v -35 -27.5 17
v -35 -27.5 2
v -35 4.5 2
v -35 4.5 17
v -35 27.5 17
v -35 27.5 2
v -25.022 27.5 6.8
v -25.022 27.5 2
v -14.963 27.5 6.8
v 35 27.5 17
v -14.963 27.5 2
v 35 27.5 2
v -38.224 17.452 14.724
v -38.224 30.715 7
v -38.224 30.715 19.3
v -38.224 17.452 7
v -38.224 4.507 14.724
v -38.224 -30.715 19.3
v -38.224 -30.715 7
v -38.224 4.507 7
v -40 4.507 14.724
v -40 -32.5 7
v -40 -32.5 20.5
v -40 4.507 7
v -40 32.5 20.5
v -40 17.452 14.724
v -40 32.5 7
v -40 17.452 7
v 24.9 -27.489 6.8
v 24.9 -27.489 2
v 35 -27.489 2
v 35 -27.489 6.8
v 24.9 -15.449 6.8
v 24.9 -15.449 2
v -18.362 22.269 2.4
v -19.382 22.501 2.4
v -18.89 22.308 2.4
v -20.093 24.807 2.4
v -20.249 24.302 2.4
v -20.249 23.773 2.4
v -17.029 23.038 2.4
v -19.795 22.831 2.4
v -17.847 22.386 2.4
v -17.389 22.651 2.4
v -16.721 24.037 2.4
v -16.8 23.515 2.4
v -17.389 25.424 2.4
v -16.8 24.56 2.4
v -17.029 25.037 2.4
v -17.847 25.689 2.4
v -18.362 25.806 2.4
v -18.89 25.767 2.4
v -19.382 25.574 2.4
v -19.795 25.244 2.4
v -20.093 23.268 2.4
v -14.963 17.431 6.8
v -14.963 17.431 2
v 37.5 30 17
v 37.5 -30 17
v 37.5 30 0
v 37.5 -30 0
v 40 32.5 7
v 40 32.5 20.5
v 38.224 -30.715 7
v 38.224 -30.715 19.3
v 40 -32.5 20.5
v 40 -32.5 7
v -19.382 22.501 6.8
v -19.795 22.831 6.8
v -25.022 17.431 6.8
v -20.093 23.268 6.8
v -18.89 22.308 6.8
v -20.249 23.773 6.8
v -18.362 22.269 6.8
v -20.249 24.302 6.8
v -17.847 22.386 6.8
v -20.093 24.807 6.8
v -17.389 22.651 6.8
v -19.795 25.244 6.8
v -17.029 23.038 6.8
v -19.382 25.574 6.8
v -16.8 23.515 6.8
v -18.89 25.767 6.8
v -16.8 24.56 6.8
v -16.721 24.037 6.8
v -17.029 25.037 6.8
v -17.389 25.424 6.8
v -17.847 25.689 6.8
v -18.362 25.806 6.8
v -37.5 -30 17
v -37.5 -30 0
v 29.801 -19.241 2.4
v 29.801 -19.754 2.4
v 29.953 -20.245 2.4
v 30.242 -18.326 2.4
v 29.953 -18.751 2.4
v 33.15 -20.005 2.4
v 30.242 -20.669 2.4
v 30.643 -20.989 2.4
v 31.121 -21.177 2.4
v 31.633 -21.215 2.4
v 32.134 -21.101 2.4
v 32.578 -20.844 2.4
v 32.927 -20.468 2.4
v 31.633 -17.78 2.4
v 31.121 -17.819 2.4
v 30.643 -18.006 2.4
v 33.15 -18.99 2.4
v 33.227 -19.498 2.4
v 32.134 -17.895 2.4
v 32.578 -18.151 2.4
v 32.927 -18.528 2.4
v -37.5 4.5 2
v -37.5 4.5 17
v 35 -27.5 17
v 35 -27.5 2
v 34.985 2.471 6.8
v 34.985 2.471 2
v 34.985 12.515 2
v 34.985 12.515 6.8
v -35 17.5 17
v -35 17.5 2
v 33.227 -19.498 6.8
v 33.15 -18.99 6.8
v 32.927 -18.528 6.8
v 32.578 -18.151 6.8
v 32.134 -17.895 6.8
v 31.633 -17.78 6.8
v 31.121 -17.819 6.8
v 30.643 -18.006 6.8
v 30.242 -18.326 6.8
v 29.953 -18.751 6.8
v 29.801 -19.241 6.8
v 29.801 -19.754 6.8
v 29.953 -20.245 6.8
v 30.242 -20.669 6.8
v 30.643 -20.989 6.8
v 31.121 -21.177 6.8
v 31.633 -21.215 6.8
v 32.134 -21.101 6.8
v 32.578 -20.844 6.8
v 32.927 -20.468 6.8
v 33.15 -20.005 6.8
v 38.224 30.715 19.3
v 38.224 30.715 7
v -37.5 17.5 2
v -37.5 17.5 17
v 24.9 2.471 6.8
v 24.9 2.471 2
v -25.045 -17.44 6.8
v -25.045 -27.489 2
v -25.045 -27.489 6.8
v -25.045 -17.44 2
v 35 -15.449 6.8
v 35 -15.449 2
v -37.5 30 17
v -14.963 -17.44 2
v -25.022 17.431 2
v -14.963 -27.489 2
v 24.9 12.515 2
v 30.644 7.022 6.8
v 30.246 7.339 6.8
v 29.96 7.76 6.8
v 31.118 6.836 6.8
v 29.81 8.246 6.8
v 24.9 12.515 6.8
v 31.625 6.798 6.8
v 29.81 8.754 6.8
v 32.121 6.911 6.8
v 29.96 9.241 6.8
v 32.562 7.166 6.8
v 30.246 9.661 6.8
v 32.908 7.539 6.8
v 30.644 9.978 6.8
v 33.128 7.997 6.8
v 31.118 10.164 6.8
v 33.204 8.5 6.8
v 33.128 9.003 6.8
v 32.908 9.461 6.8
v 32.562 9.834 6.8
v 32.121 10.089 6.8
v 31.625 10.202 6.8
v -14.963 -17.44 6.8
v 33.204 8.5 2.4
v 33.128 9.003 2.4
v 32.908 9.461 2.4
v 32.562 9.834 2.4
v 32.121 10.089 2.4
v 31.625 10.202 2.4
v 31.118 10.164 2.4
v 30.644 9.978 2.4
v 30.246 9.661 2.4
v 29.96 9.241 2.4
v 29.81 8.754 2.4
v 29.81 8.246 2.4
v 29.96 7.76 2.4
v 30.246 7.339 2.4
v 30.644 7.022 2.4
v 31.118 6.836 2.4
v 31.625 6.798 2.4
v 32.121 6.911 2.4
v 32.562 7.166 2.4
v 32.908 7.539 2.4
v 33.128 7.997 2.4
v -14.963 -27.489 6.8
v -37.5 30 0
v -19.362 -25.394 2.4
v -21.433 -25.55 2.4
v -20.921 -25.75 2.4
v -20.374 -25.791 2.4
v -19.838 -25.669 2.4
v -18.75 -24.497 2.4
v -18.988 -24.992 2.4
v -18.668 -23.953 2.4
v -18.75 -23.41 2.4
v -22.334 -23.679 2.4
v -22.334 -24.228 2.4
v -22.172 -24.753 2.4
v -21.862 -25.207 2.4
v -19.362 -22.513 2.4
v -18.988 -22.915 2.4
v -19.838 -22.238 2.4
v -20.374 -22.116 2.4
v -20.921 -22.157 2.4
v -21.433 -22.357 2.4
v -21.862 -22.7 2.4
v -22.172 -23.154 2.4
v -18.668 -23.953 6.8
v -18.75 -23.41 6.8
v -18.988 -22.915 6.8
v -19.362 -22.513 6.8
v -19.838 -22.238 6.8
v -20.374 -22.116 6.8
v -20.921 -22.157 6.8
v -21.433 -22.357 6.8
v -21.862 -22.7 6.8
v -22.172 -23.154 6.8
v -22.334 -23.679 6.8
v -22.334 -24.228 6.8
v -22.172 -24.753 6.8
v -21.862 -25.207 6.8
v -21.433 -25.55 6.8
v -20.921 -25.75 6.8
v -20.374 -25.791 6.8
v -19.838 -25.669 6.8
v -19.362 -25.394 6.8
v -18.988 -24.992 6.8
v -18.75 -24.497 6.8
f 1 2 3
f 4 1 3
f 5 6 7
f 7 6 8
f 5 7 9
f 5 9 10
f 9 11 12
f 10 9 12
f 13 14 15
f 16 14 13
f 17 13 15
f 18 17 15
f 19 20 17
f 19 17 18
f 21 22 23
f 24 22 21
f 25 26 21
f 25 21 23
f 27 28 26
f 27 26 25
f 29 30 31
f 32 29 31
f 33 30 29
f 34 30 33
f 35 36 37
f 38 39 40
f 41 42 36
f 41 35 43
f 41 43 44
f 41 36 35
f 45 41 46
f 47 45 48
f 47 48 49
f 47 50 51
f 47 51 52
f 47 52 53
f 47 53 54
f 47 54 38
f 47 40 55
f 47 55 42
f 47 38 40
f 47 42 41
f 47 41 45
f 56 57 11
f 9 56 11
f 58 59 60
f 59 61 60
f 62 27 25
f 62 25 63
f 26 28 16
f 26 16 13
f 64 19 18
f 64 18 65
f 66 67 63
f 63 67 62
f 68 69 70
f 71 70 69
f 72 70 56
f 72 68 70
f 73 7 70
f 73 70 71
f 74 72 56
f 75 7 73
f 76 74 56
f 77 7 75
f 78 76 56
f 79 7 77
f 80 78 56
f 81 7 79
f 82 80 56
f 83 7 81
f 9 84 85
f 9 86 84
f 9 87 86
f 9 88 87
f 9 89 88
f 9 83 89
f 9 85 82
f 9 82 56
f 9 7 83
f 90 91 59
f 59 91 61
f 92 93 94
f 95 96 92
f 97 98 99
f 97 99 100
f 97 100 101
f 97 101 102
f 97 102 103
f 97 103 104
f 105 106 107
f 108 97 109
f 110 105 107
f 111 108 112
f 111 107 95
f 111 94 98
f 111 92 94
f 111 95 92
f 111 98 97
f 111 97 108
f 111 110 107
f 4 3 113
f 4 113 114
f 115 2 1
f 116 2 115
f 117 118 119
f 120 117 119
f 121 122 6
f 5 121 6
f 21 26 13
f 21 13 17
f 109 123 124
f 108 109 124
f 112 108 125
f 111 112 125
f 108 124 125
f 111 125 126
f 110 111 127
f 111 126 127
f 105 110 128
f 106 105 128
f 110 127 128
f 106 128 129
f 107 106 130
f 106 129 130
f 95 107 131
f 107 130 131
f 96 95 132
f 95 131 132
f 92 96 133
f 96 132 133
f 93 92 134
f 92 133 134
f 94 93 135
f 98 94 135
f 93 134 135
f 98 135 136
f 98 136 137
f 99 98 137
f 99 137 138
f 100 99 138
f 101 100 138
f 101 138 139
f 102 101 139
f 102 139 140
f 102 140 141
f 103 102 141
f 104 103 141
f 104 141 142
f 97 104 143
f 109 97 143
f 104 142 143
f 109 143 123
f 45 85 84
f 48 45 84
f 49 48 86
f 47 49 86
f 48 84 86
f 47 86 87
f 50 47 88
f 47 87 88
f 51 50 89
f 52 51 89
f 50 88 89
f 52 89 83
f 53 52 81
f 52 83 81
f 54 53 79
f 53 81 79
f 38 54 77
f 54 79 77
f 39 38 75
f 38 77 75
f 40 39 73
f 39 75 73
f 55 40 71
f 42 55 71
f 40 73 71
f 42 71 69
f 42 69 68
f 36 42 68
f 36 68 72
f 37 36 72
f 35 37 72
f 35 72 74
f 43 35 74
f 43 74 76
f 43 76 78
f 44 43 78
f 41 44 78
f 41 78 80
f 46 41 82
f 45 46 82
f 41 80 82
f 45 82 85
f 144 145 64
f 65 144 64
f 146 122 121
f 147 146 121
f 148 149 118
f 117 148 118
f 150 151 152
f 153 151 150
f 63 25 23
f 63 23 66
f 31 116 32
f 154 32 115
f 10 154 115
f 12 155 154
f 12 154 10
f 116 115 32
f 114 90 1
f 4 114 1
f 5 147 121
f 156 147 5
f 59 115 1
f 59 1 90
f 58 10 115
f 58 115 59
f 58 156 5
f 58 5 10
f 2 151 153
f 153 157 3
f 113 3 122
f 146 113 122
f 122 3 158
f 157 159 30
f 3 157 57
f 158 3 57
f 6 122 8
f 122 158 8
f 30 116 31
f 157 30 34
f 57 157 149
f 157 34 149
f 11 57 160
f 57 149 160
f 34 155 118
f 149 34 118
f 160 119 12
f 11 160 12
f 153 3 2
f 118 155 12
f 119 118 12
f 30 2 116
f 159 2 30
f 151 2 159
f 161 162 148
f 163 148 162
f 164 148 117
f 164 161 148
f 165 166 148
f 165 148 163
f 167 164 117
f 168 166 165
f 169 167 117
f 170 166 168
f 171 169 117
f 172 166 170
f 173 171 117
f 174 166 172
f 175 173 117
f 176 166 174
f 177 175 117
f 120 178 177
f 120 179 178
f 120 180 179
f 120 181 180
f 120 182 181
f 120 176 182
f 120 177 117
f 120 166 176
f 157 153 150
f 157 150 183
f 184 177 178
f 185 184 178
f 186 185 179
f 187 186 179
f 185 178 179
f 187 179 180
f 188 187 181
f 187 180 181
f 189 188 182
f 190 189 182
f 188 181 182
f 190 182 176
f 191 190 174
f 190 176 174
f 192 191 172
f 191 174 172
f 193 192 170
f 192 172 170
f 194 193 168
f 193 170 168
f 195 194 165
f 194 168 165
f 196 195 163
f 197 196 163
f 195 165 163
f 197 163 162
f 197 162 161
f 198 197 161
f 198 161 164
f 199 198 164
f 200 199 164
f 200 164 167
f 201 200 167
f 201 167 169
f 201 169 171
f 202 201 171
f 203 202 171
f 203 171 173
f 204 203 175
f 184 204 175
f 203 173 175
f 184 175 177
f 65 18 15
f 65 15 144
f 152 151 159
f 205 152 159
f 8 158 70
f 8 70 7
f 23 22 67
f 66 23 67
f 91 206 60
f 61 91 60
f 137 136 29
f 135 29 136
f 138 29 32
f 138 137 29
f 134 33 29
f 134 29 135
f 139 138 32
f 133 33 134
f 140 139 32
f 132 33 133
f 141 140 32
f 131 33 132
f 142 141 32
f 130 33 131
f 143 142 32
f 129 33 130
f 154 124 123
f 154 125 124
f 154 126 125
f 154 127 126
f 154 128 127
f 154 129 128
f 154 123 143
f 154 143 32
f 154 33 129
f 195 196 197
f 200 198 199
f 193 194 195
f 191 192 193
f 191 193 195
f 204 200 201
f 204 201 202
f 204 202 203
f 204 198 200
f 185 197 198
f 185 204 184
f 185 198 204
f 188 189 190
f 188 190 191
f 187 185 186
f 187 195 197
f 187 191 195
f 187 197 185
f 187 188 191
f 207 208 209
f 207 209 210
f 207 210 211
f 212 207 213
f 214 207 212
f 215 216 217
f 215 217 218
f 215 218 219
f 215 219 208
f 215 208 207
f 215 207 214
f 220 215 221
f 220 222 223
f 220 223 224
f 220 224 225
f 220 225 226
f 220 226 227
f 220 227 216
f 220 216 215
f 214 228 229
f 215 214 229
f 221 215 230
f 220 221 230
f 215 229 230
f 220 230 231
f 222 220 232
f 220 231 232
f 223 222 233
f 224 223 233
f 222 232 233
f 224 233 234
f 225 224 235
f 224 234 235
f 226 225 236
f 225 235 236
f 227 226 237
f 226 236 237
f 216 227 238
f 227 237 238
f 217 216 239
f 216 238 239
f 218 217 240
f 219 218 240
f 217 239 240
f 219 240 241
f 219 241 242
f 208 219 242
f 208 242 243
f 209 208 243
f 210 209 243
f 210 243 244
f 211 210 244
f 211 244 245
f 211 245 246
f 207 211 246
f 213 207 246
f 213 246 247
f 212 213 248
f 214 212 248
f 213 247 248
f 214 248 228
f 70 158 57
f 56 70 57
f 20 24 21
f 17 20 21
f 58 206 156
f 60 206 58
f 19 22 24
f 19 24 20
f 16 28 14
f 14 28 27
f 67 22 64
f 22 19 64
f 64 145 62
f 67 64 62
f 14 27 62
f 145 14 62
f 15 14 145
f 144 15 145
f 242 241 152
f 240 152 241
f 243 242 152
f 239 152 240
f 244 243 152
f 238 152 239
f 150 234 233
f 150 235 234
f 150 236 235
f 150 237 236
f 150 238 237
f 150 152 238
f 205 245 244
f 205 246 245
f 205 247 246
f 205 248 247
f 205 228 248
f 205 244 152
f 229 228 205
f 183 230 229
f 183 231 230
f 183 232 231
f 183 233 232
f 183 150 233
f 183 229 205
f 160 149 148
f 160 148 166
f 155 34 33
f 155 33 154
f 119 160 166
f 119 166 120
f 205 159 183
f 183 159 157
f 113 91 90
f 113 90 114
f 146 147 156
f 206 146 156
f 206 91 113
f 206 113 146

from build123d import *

# Parameters (mm, degrees)
F0_W      = 75
F0_H      = 60
F1_DEPTH  = 2
F2_W      = 75
F2_H      = 60
F2_W_2    = 70
F2_H_2    = 55
F3_DEPTH  = 15
F6_W      = 13
F6_H      = 15
F7_DEPTH  = 2.5
F8_W      = 80
F8_H      = 65
F9_DEPTH  = 13.5
F10_W     = 76.4489173889
F10_H     = 61.4301860332
F11_DEPTH = 12.3
F12_W     = 12.9451896064
F12_H     = 7.7239975631
F13_DEPTH = 25
F14_W     = 10.0594116375
F14_H     = 10.0846514106
F14_W_2   = 10.0856106728
F14_H_2   = 10.043987073
F14_W_3   = 10.1302694529
F14_H_3   = 12.0400618762
F14_W_4   = 10.0820055231
F14_H_4   = 10.0494008511
F15_DEPTH = 4.8
F16_R     = 1.7738329655
F16_R_2   = 1.7066073619
F16_R_3   = 1.7222481611
F16_R_4   = 1.8430179388
F17_DEPTH = 4.4


with BuildPart() as f1:
    # F0 (on Top) → F1 (new body)
    with BuildSketch(Plane.XY):
        Rectangle(F0_W, F0_H)
    extrude(amount=F1_DEPTH)

    # F2 (on face) → F3 (join)
    with BuildSketch(Plane.XY.offset(2)):
        Rectangle(F2_W, F2_H)
        Rectangle(F2_W_2, F2_H_2, mode=Mode.SUBTRACT)
    extrude(amount=F3_DEPTH)

    # F6 (on face) → F7 (cut, through all)
    with BuildSketch(Plane.YZ.offset(-35)):
        with Locations((11, 9.5)):
            Rectangle(F6_W, F6_H)
    extrude(amount=-F7_DEPTH, mode=Mode.SUBTRACT)

    # F14 (on face) → F15 (join)
    with BuildSketch(Plane.XY.offset(2)):
        with Locations((-19.992497284, 22.4738009274)):
            Rectangle(F14_W, F14_H)
        with Locations((29.9425097182, 7.4932300486)):
            Rectangle(F14_W_2, F14_H_2)
        with Locations((29.9648391083, -21.4694244787)):
            Rectangle(F14_W_3, F14_H_3)
        with Locations((-20.0037942268, -22.4647549912)):
            Rectangle(F14_W_4, F14_H_4)
    extrude(amount=F15_DEPTH)

    # F16 (on face) → F17 (cut)
    with BuildSketch(Plane.XY.offset(6.8)):
        with Locations((-18.4948202223, 24.0374710411)):
            Circle(F16_R)
        with Locations((31.4975194633, 8.5000935942)):
            Circle(F16_R_2)
        with Locations((31.5043963492, -19.4977931678)):
            Circle(F16_R_3)
        with Locations((-20.5112546682, -23.9534582943)):
            Circle(F16_R_4)
    extrude(amount=-F17_DEPTH, mode=Mode.SUBTRACT)


with BuildPart() as f9:
    # F8 (on offset) → F9 (new body)
    with BuildSketch(Plane.XY.offset(7)):
        Rectangle(F8_W, F8_H)
    extrude(amount=F9_DEPTH)

    # F10 (on face) → F11 (cut)
    with BuildSketch(Plane(origin=(0, 0, 7), x_dir=(1, 0, 0), z_dir=(0, 0, -1))):
        Rectangle(F10_W, F10_H)
    extrude(amount=-F11_DEPTH, mode=Mode.SUBTRACT)

    # F12 (on face) → F13 (cut)
    with BuildSketch(Plane(origin=(-40, 0, 0), x_dir=(0, -1, 0), z_dir=(-1, 0, 0))):
        with Locations((-10.9797643963, 10.8619987816)):
            Rectangle(F12_W, F12_H)
    extrude(amount=-F13_DEPTH, mode=Mode.SUBTRACT)


solid = Compound([f1.part, f9.part])
